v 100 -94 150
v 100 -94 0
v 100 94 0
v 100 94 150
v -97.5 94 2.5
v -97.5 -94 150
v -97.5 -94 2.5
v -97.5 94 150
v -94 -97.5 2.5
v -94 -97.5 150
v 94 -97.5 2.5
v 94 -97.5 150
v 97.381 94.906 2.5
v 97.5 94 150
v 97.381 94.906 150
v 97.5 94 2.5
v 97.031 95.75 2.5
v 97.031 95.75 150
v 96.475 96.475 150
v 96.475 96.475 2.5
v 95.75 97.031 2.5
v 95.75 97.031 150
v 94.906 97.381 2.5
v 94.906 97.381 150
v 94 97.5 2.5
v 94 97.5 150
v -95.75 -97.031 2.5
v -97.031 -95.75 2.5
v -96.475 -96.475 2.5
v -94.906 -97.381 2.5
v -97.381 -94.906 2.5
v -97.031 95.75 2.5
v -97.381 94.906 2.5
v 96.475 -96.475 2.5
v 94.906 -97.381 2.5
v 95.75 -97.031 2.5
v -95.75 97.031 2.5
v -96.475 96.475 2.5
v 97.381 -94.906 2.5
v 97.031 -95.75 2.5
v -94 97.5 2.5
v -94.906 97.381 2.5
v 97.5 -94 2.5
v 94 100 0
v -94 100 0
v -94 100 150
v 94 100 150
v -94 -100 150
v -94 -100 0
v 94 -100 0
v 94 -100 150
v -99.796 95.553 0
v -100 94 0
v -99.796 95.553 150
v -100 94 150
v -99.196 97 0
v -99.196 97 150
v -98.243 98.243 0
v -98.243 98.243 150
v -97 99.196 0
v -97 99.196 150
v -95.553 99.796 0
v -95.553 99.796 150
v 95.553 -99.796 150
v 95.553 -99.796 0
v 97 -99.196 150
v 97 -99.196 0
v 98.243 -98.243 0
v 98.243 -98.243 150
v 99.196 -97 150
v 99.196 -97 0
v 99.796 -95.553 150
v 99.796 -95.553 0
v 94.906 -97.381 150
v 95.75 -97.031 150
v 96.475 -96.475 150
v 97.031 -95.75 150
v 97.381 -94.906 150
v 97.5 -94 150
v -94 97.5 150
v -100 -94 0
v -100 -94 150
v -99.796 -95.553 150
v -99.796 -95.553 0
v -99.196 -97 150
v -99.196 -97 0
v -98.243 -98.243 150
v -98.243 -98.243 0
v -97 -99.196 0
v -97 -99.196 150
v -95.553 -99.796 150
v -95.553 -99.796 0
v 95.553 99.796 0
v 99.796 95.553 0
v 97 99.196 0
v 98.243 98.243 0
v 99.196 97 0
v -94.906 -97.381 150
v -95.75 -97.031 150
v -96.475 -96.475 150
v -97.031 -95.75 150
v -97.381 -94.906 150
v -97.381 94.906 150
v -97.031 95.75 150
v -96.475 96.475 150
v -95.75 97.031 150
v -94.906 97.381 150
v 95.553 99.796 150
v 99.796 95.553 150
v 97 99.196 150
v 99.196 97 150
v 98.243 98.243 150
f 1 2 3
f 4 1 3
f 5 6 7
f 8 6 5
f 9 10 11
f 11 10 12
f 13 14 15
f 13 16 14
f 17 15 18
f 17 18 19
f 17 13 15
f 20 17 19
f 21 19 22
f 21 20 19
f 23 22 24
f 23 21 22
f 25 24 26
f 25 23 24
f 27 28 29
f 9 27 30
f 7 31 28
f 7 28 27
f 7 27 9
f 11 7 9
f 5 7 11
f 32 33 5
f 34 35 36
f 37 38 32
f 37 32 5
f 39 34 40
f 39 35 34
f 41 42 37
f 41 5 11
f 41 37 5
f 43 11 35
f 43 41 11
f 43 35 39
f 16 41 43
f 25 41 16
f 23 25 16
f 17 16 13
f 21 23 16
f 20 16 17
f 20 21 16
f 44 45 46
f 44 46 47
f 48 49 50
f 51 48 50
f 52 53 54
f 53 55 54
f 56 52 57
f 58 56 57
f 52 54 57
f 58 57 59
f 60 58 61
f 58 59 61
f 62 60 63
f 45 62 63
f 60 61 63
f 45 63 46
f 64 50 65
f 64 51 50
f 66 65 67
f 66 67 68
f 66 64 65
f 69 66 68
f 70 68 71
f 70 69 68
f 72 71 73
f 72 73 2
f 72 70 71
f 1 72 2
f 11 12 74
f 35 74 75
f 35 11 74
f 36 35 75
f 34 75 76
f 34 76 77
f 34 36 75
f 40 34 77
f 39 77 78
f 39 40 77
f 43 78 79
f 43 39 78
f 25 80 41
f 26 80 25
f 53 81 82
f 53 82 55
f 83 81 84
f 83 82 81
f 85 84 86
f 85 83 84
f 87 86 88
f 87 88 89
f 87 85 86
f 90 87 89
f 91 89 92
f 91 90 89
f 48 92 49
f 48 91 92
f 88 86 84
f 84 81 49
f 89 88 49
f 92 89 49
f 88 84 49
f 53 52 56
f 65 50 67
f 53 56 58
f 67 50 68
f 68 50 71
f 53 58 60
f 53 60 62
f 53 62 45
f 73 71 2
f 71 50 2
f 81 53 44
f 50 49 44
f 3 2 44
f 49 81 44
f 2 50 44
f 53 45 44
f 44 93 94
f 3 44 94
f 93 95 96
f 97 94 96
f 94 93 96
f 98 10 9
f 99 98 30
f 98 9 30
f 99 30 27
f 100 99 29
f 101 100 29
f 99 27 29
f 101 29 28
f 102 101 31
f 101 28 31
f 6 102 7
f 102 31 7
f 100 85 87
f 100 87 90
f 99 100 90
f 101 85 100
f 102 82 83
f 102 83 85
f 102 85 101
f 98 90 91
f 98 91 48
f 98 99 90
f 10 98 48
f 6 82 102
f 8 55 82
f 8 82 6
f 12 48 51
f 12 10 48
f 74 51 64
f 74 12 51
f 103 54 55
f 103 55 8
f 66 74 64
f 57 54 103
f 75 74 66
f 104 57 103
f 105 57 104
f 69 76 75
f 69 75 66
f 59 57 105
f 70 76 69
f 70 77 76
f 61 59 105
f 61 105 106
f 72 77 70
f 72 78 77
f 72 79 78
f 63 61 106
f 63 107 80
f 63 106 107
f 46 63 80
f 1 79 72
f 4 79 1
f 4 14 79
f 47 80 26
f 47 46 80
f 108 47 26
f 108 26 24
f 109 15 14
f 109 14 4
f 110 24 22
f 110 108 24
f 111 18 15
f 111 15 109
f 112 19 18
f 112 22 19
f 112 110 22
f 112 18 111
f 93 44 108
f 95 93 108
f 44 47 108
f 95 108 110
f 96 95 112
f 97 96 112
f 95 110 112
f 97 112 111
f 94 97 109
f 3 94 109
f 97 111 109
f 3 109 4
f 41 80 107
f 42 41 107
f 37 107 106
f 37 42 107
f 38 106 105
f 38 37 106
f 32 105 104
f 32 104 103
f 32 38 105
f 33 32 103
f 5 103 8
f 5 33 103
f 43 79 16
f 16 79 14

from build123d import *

# Parameters (mm, degrees)
SKETCH004_W     = 200
SKETCH004_H     = 200
PAD001_DEPTH    = 150
SKETCH005_W     = 195
SKETCH005_H     = 195
POCKET002_DEPTH = 147.5
FILLET_R        = 6
FILLET001_R     = 3.5


with BuildPart() as part:
    # Sketch004 → Pad001 (new body)
    with BuildSketch(Plane.XY):
        Rectangle(SKETCH004_W, SKETCH004_H)
    extrude(amount=PAD001_DEPTH)

    # Sketch005 (on Face6 of Pad001) → Pocket002 (cut)
    with BuildSketch(Plane.XY.offset(150)):
        Rectangle(SKETCH005_W, SKETCH005_H)
    extrude(amount=-POCKET002_DEPTH, mode=Mode.SUBTRACT)

    # Fillet
    fillet_edges = [part.edges().sort_by_distance(p)[0] for p in [
        (-100, -100, 75),
        (100, -100, 75),
        (100, 100, 75),
        (-100, 100, 75),
    ]]
    fillet(fillet_edges, radius=FILLET_R)

    # Fillet001
    fillet001_edges = [part.edges().sort_by_distance(p)[0] for p in [
        (97.5, 97.5, 76.25),
        (-97.5, 97.5, 76.25),
        (97.5, -97.5, 76.25),
        (-97.5, -97.5, 76.25),
    ]]
    fillet(fillet001_edges, radius=FILLET001_R)


solid = part.part
